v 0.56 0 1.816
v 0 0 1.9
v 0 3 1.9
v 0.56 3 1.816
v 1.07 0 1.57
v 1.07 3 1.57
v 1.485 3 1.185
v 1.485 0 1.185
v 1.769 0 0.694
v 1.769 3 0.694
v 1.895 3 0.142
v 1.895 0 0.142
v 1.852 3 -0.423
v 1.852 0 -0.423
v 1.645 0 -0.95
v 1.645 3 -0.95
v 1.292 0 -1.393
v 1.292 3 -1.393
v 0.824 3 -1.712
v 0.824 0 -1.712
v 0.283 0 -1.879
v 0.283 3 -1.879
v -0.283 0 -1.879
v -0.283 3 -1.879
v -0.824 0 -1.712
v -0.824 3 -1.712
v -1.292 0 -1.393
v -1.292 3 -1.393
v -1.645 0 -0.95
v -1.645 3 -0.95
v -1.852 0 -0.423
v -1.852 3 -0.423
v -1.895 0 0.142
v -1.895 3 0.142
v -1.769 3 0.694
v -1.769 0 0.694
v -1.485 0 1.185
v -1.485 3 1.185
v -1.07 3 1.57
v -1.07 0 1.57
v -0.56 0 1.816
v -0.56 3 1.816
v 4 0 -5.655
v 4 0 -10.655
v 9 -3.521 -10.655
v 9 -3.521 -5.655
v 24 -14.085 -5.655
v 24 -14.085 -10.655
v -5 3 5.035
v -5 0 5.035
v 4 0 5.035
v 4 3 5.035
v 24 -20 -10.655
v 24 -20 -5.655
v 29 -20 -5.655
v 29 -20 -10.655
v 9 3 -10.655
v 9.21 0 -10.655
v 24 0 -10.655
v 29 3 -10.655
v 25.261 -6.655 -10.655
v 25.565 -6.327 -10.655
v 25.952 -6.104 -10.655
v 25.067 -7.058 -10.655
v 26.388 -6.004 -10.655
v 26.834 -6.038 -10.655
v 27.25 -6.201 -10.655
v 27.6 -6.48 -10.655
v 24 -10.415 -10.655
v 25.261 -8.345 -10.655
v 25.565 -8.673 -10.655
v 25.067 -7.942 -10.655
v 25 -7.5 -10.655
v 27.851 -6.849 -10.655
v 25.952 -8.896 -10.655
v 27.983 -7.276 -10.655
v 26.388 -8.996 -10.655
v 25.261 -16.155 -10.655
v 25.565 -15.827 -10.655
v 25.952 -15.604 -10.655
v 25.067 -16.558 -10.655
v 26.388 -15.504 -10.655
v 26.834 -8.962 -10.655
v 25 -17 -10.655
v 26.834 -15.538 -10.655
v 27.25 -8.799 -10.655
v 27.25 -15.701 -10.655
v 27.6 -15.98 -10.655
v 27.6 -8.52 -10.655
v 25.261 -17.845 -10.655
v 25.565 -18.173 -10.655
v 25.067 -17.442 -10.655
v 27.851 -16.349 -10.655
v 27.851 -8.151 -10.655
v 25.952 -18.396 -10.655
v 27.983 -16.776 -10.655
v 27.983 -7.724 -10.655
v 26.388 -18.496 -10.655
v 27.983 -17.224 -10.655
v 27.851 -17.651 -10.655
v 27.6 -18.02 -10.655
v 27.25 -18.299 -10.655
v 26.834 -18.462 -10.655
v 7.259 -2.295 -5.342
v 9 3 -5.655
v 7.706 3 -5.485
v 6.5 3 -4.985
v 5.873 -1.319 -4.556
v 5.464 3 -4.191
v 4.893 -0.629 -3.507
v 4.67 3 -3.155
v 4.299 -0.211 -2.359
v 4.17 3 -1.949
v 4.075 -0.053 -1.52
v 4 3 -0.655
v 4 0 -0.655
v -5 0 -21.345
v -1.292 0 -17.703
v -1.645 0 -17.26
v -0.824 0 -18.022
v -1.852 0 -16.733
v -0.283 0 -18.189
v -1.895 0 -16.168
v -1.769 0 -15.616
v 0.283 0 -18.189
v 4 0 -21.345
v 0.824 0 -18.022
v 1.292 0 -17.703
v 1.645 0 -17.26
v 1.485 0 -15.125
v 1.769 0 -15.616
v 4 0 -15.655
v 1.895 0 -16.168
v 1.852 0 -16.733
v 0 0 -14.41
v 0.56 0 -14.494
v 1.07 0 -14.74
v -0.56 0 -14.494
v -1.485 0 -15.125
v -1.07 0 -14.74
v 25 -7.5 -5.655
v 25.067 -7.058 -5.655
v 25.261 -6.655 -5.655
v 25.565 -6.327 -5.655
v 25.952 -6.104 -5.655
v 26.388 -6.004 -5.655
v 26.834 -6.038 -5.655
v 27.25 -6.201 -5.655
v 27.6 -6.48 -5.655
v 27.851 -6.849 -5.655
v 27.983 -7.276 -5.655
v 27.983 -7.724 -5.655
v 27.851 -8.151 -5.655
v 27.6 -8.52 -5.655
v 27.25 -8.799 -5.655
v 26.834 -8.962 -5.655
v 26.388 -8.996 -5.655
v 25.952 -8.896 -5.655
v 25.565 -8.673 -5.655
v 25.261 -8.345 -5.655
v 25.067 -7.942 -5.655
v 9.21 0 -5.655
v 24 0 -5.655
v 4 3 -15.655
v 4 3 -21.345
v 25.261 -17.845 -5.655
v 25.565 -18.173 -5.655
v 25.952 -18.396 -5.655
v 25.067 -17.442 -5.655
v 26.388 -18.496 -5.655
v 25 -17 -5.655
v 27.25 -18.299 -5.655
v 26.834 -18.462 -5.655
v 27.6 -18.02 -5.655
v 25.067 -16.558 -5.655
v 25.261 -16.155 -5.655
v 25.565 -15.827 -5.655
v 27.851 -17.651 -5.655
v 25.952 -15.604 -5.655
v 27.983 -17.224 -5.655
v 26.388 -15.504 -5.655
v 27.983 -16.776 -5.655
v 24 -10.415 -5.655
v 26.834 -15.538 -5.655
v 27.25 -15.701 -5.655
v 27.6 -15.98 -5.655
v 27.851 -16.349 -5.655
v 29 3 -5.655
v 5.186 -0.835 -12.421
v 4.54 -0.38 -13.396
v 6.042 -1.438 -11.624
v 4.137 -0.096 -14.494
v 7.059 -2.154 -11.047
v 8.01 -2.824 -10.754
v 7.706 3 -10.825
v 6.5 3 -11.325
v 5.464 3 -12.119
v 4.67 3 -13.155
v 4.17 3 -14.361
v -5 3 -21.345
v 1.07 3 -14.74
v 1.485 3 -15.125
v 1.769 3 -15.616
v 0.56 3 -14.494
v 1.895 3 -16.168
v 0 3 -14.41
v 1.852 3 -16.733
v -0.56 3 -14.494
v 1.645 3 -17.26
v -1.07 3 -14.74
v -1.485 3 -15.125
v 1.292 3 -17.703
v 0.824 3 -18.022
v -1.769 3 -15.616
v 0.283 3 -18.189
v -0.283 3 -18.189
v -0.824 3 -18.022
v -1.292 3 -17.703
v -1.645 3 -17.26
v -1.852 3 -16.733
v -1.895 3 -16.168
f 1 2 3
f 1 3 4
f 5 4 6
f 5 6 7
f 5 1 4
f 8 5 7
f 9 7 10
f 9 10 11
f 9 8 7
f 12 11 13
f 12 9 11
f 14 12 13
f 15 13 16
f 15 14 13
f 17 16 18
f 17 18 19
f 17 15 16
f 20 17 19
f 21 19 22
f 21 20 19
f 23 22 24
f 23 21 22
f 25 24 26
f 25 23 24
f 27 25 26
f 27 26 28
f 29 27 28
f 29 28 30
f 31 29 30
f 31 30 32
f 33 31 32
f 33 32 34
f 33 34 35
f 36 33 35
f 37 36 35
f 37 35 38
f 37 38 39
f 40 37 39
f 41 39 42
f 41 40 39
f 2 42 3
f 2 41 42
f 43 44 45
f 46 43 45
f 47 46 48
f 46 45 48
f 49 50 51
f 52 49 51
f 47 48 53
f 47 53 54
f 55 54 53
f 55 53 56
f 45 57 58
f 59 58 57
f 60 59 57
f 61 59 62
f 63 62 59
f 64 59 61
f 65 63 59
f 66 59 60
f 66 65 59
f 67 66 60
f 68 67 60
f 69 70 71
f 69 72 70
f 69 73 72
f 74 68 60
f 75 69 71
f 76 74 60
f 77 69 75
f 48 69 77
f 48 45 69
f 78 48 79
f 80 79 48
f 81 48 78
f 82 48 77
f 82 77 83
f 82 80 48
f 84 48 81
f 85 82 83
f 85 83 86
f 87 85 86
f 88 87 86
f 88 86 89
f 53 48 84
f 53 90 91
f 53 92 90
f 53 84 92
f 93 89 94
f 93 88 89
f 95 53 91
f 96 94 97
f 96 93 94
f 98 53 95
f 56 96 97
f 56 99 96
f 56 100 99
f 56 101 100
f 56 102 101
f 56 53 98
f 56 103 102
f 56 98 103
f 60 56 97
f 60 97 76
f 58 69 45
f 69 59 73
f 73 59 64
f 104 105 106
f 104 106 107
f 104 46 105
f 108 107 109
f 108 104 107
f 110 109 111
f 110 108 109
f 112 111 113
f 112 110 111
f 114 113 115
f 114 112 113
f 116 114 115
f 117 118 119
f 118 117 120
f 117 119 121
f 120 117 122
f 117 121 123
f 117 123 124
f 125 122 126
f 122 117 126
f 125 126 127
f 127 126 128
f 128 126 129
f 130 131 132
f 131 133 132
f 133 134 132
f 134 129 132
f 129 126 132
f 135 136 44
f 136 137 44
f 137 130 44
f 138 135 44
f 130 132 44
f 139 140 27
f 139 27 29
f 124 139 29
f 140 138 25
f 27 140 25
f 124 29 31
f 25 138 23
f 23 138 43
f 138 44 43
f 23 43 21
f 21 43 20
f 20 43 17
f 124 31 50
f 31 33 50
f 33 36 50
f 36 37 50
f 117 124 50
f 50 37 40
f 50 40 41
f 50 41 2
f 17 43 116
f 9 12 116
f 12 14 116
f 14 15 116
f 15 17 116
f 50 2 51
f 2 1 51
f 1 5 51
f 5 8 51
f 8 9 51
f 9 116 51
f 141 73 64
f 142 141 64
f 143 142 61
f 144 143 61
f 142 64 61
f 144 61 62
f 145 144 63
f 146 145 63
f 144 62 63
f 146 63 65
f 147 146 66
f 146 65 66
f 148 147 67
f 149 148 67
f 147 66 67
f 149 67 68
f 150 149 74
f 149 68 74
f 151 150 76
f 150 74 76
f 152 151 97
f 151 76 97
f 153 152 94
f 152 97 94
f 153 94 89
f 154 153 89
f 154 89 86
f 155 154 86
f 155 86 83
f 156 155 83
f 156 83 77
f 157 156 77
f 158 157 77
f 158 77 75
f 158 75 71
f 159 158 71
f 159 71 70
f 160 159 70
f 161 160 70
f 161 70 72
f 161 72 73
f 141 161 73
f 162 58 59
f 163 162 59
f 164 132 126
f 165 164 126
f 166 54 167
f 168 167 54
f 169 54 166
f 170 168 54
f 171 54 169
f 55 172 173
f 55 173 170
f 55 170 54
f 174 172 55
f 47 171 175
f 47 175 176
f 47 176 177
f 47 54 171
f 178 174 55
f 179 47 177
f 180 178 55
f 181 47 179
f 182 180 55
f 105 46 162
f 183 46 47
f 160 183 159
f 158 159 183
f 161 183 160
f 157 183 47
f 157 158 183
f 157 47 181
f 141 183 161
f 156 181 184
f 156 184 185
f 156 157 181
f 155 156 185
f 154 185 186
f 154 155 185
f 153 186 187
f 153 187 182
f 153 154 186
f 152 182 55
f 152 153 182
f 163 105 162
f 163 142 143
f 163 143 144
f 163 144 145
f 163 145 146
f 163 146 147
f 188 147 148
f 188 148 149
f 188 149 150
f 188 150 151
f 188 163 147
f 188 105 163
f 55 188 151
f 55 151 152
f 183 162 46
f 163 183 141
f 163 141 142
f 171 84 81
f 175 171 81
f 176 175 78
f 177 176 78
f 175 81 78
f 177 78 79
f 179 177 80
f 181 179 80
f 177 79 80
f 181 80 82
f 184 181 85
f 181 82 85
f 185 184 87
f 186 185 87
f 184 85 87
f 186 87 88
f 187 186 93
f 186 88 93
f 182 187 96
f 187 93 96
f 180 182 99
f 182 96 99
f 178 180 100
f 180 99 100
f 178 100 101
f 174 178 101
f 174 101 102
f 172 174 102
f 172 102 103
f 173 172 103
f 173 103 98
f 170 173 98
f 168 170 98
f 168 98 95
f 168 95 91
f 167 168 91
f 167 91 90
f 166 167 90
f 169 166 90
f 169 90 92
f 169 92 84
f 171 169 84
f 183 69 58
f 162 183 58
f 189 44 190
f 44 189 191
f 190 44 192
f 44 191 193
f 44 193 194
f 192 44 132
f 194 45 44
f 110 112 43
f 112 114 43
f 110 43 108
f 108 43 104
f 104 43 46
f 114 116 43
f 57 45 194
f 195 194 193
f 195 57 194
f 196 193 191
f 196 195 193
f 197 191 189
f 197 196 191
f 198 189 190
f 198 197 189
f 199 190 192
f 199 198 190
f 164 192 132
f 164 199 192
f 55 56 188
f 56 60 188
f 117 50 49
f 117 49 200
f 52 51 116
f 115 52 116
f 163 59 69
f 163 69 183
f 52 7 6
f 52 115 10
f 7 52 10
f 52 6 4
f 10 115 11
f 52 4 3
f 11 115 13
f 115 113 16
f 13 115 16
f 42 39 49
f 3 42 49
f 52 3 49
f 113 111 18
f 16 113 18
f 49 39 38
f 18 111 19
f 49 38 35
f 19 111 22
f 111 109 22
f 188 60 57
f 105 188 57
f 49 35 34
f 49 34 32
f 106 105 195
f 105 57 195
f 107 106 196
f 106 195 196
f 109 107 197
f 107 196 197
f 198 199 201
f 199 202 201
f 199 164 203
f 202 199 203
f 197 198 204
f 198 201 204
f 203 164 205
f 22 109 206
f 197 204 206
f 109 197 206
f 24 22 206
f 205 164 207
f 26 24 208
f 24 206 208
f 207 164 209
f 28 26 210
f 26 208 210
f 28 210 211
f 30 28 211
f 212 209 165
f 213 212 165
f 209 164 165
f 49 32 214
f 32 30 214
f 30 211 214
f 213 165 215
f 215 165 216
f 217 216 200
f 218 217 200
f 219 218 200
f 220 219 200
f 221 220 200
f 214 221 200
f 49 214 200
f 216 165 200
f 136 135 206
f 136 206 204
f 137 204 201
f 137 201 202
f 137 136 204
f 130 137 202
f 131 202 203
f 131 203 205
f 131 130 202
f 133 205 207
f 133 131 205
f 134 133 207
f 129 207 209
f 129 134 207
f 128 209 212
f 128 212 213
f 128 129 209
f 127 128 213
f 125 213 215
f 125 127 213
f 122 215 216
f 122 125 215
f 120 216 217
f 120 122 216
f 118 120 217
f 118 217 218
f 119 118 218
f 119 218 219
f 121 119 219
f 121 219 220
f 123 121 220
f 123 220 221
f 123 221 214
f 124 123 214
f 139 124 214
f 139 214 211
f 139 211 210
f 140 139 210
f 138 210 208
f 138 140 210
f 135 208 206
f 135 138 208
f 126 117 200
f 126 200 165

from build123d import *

# Parameters (mm, degrees)
SKETCH1_W                       = 9
SKETCH1_H                       = 26.38
SKETCH1_R                       = 1.9
BODY_MOUNT_DEPTH                = 3
SKETCH2_W                       = 5
SKETCH2_H                       = 3
BOSS_EXTRUDE2_DEPTH             = 25
SKETCH3_W                       = 5
SKETCH3_H                       = 5
BOSS_EXTRUDE3_DEPTH             = 20
SKETCH4_R                       = 1.5
CUT_EXTRUDE1_DEPTH              = 20
BOSS_EXTRUDE4_REACH             = 39.616
BOSS_EXTRUDE4_DIRECTION_2_REACH = 39.616
FILLET2_R                       = 5


with BuildPart() as part:
    # Sketch1 → body mount (new body)
    with BuildSketch(Plane(origin=(0, 0, 0), x_dir=(1, 0, 0), z_dir=(0, 1, 0))):
        with Locations((-0.5, 8.155)):
            Rectangle(SKETCH1_W, SKETCH1_H)
        with Locations(Location((0, 0, 0), (0, 0, 270))):
            Circle(SKETCH1_R, mode=Mode.SUBTRACT)
        with Locations(Location((0, 16.31, 0), (0, 0, 270))):
            Circle(SKETCH1_R, mode=Mode.SUBTRACT)
    extrude(amount=BODY_MOUNT_DEPTH)

    # Sketch2 → Boss-Extrude2 (add)
    with BuildSketch(Plane(origin=(4, 0, 0), x_dir=(0, 0, -1), z_dir=(1, 0, 0))):
        with Locations((8.155, 1.5)):
            Rectangle(SKETCH2_W, SKETCH2_H)
    extrude(amount=BOSS_EXTRUDE2_DEPTH)

    # Sketch3 → Boss-Extrude3 (add)
    with BuildSketch(Plane.XZ):
        with Locations((26.5, -8.155)):
            Rectangle(SKETCH3_W, SKETCH3_H)
    extrude(amount=BOSS_EXTRUDE3_DEPTH)

    # Sketch4 → Cut-Extrude1 (cut)
    with BuildSketch(Plane(origin=(0, 0, -10.655), x_dir=(-1, 0, 0), z_dir=(0, 0, -1))):
        with Locations((-26.5, -17)):
            Circle(SKETCH4_R)
        with Locations((-26.5, -7.5)):
            Circle(SKETCH4_R)
    extrude(amount=-CUT_EXTRUDE1_DEPTH, mode=Mode.SUBTRACT)

    # Boss-Extrude4: up to this face of the body (flat: up to its plane)
    boss_extrude4_end = Plane(part.part.faces().sort_by_distance((16.5, 2.660294245, -10.655))[0])
    # Sketch5 → Boss-Extrude4 (add, up to the picked face)
    with BuildSketch(Plane(origin=(0, 0, -8.155), x_dir=(-1, 0, 0), z_dir=(0, 0, -1)), mode=Mode.PRIVATE) as boss_extrude4_sk1:
        Polygon((-24, -10.415369352), (-9.210305315, 0), (-4, 0), (-24, -14.084630648), align=None)
    boss_extrude4_tool1 = split(extrude(boss_extrude4_sk1.sketch, amount=BOSS_EXTRUDE4_REACH, mode=Mode.PRIVATE), bisect_by=boss_extrude4_end, keep=Keep.BOTH, mode=Mode.PRIVATE)
    add(boss_extrude4_tool1.solids().sort_by(Axis((15.237549, -6.170794, -8.155), (0, 0, -1)))[0])

    # Boss-Extrude4 direction 2: up to this face of the body (flat: up to its plane)
    boss_extrude4_direction_2_end = Plane(part.part.faces().sort_by_distance((14, 0.339705755, -5.655))[0])
    # Sketch5 → Boss-Extrude4 direction 2 (add, up to the picked face)
    with BuildSketch(Plane(origin=(0, 0, -8.155), x_dir=(-1, 0, 0), z_dir=(0, 0, -1)), mode=Mode.PRIVATE) as boss_extrude4_direction_2_sk1:
        Polygon((-24, -10.415369352), (-9.210305315, 0), (-4, 0), (-24, -14.084630648), align=None)
    boss_extrude4_direction_2_tool1 = split(extrude(boss_extrude4_direction_2_sk1.sketch, amount=-BOSS_EXTRUDE4_DIRECTION_2_REACH, mode=Mode.PRIVATE), bisect_by=boss_extrude4_direction_2_end, keep=Keep.BOTH, mode=Mode.PRIVATE)
    add(boss_extrude4_direction_2_tool1.solids().sort_by(Axis((15.237549, -6.170794, -8.155), (0, 0, 1)))[0])

    # Fillet2
    # the kernel refuses this fillet: 5 mm, written as the material it adds along each edge
    with BuildSketch(Plane(origin=(4, 3, -10.655), x_dir=(0, 0, -1), z_dir=(0, -1, 0))) as fillet2_piece_1_section:
        with BuildLine():
            CenterArc((FILLET2_R, FILLET2_R), FILLET2_R, 180, 90)
            Line((0, FILLET2_R), (0, 0))
            Line((0, 0), (FILLET2_R, 0))
        make_face()
    fillet2_piece_1 = extrude(amount=3, mode=Mode.PRIVATE)
    fillet2_piece_1 = split(fillet2_piece_1, bisect_by=Plane(origin=(4.050655402, -0.035673131, -11.785736825), z_dir=(0.5757819971310116, 0.8176032606220598, 0)), keep=Keep.TOP, mode=Mode.PRIVATE)
    add(fillet2_piece_1)
    with BuildSketch(Plane(origin=(4, 3, -10.655), x_dir=(0, 0, -1), z_dir=(0, -1, 0))) as fillet2_piece_2_section:
        with BuildLine():
            CenterArc((FILLET2_R, FILLET2_R), FILLET2_R, 180, 90)
            Line((0, FILLET2_R), (0, 0))
            Line((0, 0), (FILLET2_R, 0))
        make_face()
    fillet2_piece_2 = extrude(amount=15.5, mode=Mode.PRIVATE)
    fillet2_piece_2 = split(fillet2_piece_2, bisect_by=Plane(origin=(6.150590259, 0, -11.187362576), z_dir=(0, -1, 0)), keep=Keep.TOP, mode=Mode.PRIVATE)
    fillet2_piece_2 = split(fillet2_piece_2, bisect_by=Plane(origin=(5.79410314, -1.263464003, -11.187362576), z_dir=(0.5757819971310116, 0.8176032606220598, 0)), keep=Keep.TOP, mode=Mode.PRIVATE)
    add(fillet2_piece_2)
    with BuildSketch(Plane(origin=(4, -12.5, -5.655), x_dir=(1, 0, 0), z_dir=(0, 1, 0))) as fillet2_piece_3_section:
        with BuildLine():
            CenterArc((FILLET2_R, -FILLET2_R), FILLET2_R, 90, 90)
            Line((0, -FILLET2_R), (0, 0))
            Line((0, 0), (FILLET2_R, 0))
        make_face()
    fillet2_piece_3 = extrude(amount=15.5, mode=Mode.PRIVATE)
    fillet2_piece_3 = split(fillet2_piece_3, bisect_by=Plane(origin=(5.79410314, -1.263464003, -5.122637424), z_dir=(0.5757819971310116, 0.8176032606220598, 0)), keep=Keep.TOP, mode=Mode.PRIVATE)
    fillet2_piece_3 = split(fillet2_piece_3, bisect_by=Plane(origin=(6.150590259, 0, -5.122637424), z_dir=(0, -1, 0)), keep=Keep.TOP, mode=Mode.PRIVATE)
    add(fillet2_piece_3)
    with BuildSketch(Plane(origin=(4, 0, -5.655), x_dir=(1, 0, 0), z_dir=(0, 1, 0))) as fillet2_piece_4_section:
        with BuildLine():
            CenterArc((FILLET2_R, -FILLET2_R), FILLET2_R, 90, 90)
            Line((0, -FILLET2_R), (0, 0))
            Line((0, 0), (FILLET2_R, 0))
        make_face()
    fillet2_piece_4 = extrude(amount=3, mode=Mode.PRIVATE)
    fillet2_piece_4 = split(fillet2_piece_4, bisect_by=Plane(origin=(4.050655402, -0.035673131, -4.524263175), z_dir=(0.5757819971310116, 0.8176032606220598, 0)), keep=Keep.TOP, mode=Mode.PRIVATE)
    add(fillet2_piece_4)


solid = part.part
